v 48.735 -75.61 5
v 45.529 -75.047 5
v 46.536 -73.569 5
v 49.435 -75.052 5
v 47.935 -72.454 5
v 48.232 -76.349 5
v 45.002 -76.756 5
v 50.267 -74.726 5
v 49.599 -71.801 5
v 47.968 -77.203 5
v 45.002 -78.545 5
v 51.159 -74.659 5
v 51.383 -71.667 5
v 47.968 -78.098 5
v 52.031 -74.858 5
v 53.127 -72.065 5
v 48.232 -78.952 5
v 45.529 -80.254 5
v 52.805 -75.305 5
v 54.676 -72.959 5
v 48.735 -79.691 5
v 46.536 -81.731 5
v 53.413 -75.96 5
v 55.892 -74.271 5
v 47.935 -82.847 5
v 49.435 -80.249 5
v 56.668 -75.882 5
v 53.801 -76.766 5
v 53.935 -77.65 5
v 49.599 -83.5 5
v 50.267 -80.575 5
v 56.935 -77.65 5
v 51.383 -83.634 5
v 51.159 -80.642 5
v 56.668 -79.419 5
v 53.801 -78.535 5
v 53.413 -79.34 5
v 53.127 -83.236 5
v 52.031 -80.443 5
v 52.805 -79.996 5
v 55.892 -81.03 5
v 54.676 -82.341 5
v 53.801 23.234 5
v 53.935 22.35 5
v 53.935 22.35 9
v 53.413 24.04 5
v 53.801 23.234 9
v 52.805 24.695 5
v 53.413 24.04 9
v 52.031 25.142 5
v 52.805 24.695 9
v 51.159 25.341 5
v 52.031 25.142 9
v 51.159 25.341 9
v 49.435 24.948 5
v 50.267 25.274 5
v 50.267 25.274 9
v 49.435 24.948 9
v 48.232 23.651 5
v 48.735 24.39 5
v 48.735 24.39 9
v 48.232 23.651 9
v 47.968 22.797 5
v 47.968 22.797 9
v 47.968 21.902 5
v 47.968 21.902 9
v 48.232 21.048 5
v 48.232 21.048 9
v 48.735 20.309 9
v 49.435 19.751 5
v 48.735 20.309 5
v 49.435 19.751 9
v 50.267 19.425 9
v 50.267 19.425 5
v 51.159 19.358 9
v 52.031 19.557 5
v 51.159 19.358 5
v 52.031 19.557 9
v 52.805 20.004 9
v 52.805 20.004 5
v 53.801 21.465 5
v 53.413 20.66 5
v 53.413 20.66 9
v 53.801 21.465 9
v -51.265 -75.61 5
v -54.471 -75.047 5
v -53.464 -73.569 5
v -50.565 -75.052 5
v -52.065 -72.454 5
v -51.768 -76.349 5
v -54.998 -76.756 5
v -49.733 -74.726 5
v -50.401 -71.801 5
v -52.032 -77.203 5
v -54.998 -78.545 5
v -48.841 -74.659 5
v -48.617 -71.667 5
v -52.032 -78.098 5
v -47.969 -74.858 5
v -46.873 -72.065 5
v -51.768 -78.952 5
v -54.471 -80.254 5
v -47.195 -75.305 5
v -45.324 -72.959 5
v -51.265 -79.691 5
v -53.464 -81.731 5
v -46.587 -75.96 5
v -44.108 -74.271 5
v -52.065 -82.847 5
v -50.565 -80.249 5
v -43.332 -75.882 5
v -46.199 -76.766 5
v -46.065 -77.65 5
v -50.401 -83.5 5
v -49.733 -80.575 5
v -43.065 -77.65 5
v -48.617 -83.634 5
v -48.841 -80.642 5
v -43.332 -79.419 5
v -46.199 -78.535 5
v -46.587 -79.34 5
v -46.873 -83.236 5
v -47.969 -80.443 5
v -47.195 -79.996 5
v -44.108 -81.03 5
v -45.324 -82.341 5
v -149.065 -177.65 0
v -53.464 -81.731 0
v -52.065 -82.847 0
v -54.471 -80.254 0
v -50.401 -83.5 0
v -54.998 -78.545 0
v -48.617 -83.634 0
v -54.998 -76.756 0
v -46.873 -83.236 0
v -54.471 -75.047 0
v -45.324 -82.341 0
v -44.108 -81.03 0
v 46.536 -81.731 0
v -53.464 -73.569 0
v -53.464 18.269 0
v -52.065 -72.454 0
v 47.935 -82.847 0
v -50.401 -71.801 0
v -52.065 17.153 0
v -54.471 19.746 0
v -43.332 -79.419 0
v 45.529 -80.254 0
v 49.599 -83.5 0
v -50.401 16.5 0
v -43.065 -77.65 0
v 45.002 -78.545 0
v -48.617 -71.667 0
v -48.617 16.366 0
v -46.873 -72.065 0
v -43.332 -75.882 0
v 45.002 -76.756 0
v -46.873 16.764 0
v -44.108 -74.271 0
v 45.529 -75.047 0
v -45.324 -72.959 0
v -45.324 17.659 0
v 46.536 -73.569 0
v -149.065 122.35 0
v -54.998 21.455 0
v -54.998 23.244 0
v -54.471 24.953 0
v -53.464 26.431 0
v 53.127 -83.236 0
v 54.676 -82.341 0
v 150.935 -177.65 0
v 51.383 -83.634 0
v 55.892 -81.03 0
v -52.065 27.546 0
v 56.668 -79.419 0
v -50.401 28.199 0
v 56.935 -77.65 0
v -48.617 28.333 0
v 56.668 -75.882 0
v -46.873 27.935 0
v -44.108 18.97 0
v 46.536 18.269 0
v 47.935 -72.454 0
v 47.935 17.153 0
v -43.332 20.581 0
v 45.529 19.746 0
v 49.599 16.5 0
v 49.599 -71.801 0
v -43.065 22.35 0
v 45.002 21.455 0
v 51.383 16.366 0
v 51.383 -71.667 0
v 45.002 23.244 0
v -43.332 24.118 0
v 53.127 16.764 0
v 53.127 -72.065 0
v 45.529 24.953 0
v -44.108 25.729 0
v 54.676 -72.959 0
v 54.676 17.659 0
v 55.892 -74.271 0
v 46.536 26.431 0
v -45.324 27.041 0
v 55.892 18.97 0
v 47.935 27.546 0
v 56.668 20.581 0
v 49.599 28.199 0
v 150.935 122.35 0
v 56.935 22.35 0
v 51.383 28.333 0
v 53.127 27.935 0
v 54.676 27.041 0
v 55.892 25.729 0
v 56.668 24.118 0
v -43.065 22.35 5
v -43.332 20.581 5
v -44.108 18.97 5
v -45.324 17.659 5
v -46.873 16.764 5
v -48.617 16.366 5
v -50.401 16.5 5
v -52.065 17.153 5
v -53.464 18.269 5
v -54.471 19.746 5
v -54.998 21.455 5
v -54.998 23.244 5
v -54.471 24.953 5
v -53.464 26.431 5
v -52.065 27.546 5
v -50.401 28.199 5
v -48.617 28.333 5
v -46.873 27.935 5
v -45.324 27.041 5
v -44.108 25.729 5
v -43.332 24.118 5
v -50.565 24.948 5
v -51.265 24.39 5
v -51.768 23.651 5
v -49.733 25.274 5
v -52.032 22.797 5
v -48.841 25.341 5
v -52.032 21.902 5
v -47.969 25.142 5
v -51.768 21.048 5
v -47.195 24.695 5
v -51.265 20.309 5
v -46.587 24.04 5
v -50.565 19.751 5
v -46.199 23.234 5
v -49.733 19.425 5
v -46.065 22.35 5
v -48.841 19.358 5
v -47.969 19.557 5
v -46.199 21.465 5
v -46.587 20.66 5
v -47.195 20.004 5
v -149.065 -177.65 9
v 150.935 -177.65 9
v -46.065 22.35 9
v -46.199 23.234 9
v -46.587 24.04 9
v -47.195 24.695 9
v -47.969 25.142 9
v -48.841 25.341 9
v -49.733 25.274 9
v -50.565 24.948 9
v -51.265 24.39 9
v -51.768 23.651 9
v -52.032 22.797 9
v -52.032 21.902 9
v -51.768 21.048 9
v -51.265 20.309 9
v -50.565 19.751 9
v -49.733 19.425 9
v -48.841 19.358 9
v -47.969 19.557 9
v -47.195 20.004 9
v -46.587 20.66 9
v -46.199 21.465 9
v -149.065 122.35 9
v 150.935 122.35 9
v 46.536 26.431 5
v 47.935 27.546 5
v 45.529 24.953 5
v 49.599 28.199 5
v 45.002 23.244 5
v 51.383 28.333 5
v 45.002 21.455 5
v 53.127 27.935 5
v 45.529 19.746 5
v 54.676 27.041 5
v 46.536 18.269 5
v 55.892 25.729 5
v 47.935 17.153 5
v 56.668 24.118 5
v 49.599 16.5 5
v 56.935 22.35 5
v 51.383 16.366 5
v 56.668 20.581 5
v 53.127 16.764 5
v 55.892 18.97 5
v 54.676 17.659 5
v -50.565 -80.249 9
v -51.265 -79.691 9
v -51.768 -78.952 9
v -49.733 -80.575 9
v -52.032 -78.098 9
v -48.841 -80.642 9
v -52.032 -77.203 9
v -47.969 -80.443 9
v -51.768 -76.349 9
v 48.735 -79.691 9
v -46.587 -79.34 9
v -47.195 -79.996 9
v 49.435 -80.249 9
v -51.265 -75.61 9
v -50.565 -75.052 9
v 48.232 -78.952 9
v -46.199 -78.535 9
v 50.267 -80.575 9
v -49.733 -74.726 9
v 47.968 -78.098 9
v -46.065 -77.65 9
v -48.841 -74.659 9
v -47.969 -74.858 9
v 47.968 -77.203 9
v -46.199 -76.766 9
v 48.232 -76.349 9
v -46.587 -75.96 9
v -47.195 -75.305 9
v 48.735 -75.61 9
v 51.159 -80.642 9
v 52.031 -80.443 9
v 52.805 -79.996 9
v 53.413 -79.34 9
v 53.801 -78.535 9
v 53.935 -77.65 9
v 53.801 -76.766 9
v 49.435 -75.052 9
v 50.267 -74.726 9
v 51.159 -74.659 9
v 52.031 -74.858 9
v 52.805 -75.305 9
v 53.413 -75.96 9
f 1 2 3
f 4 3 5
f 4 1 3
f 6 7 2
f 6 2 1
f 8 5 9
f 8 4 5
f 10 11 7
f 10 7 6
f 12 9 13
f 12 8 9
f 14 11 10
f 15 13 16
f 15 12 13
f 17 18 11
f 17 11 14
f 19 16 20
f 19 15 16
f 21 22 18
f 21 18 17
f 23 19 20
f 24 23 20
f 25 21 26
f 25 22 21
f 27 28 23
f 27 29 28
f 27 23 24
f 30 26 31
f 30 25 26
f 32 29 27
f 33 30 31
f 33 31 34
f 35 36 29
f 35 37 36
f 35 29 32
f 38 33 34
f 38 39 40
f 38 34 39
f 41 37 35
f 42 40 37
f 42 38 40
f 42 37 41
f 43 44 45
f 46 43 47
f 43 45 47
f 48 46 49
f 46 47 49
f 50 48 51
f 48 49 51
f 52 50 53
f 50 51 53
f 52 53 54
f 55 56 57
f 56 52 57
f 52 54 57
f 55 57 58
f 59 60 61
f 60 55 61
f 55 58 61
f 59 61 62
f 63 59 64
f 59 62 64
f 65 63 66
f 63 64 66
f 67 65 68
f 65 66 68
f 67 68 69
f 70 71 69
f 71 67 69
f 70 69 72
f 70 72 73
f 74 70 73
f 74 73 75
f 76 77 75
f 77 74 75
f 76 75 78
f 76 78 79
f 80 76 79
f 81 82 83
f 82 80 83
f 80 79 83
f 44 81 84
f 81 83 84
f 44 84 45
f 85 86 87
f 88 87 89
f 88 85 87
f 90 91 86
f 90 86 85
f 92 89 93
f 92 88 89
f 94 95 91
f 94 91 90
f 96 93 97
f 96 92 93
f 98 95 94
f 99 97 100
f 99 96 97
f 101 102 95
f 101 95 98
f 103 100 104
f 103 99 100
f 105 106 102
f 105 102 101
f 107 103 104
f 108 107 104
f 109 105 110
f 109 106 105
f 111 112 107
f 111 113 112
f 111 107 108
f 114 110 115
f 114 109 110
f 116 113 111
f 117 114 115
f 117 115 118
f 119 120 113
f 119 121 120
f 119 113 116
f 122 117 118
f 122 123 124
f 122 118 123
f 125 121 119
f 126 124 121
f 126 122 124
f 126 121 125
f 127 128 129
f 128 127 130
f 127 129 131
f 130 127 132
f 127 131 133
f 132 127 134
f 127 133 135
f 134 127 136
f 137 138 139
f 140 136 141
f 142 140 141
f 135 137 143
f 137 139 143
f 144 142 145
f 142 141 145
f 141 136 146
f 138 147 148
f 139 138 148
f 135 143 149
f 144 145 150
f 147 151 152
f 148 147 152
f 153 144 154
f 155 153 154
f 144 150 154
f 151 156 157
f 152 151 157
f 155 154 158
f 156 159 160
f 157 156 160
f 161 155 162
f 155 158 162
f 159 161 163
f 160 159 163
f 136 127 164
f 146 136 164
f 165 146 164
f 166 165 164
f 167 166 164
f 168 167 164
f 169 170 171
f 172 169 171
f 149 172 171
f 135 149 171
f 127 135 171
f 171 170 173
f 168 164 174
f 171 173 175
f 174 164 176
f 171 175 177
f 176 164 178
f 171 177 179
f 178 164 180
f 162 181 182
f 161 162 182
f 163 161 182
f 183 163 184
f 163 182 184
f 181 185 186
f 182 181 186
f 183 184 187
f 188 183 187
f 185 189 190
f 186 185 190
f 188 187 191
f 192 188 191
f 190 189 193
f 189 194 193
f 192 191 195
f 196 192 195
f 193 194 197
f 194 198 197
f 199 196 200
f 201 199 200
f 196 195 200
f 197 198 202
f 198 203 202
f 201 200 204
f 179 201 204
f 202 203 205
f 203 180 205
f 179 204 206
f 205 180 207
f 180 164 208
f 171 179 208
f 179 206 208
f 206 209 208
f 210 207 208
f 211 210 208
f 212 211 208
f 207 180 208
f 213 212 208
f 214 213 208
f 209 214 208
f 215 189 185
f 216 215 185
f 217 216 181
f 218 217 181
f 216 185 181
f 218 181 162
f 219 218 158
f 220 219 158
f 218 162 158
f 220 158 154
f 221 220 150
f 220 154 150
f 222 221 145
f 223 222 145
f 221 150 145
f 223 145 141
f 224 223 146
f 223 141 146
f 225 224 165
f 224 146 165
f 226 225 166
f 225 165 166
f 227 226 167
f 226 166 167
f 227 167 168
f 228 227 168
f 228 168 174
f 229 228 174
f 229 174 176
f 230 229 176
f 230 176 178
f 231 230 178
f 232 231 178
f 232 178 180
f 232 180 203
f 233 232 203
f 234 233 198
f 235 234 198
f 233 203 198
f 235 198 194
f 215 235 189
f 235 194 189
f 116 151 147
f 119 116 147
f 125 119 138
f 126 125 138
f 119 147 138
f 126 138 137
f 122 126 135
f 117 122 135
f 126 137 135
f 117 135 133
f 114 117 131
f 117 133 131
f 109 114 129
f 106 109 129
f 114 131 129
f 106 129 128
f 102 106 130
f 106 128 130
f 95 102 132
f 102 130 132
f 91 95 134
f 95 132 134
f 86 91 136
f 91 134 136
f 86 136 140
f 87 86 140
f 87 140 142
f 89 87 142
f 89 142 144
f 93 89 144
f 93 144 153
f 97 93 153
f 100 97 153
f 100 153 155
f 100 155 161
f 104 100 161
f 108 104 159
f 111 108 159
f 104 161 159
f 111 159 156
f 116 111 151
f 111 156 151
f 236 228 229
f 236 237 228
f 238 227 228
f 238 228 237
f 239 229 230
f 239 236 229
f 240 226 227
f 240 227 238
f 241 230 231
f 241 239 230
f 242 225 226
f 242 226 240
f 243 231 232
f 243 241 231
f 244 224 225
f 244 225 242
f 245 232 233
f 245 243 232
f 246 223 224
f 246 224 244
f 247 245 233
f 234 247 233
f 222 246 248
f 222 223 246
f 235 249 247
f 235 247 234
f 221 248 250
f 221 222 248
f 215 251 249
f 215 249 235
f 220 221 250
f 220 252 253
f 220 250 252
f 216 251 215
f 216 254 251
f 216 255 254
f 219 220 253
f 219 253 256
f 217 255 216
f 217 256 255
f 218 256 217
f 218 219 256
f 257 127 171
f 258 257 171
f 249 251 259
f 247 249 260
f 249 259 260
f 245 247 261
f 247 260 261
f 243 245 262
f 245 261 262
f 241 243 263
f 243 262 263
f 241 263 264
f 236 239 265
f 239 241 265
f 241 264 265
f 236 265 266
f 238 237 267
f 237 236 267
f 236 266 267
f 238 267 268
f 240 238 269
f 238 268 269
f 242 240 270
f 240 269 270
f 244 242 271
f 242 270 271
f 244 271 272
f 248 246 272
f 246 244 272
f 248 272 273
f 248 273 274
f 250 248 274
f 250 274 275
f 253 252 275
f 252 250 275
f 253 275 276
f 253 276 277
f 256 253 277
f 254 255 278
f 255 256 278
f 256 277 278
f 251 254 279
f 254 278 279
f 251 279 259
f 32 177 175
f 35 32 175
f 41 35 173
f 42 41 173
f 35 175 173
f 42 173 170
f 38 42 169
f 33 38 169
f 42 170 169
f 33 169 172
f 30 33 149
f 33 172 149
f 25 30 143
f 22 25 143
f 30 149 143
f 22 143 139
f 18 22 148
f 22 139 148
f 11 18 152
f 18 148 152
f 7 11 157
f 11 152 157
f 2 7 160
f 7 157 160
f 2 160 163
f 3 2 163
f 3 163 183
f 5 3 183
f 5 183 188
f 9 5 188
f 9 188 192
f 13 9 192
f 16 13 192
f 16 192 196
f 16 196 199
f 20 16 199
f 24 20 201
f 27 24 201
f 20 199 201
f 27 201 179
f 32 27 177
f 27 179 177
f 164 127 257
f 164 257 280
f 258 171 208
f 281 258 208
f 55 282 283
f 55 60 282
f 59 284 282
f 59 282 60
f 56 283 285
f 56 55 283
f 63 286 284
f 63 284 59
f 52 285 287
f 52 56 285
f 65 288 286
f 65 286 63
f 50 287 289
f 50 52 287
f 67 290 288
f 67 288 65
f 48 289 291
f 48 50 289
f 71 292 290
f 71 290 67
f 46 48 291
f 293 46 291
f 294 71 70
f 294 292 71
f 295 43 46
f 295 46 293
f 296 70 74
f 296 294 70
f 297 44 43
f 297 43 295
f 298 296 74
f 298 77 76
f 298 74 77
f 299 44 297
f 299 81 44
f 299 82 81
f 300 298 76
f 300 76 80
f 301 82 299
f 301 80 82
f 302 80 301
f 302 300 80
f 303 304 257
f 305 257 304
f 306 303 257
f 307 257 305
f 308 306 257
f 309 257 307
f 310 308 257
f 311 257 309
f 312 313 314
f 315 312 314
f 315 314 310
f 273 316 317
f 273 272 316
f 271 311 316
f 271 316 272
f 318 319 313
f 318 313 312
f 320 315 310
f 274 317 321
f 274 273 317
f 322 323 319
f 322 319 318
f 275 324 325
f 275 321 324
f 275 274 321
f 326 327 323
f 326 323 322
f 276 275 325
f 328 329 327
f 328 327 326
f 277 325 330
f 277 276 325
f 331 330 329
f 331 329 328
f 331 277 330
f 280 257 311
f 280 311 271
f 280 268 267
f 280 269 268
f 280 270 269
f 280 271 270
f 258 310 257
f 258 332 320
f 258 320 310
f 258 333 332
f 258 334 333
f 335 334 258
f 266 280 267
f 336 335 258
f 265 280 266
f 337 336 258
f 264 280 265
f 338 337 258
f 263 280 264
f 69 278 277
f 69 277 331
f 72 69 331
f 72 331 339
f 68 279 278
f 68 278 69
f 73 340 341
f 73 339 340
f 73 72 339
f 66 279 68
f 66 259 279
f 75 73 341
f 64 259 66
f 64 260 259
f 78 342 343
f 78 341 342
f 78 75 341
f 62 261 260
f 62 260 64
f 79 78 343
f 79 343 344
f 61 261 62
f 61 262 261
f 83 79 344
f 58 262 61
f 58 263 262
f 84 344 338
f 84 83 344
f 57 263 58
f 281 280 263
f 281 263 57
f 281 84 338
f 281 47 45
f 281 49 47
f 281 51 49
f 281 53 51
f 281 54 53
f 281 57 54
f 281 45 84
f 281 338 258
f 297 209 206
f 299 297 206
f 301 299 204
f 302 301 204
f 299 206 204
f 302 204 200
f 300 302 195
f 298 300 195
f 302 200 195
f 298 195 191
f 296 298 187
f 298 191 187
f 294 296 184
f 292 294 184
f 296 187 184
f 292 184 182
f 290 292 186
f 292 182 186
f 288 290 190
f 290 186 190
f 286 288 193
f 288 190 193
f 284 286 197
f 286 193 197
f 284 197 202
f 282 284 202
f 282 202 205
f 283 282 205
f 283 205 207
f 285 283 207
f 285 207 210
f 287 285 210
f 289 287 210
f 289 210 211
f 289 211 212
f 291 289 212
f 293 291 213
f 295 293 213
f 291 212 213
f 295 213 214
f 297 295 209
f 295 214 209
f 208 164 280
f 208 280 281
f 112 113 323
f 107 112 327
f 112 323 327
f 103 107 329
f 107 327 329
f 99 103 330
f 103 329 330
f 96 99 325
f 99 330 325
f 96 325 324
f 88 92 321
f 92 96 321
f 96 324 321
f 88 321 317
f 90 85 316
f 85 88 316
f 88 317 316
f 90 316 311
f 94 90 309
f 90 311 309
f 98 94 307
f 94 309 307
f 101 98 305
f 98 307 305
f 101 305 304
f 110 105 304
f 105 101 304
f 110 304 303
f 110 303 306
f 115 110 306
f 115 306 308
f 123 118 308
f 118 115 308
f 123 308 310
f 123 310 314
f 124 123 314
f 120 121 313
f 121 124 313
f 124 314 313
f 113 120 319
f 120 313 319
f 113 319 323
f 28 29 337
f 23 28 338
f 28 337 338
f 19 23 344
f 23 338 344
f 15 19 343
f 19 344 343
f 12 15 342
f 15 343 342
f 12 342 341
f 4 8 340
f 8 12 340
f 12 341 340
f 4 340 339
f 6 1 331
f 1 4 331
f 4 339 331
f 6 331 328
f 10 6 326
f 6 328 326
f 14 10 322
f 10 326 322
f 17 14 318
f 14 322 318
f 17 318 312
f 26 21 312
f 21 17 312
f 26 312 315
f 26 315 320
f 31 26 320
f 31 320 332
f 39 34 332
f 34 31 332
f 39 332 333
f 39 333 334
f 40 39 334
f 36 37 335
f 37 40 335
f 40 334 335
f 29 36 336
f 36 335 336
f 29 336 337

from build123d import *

# Parameters (mm, degrees)
F0_W     = 300
F0_H     = 300
F1_DEPTH = 9
F2_R     = 3
F3_DEPTH = 9.001
F4_R     = 6
F4_R_2   = 3
F5_DEPTH = 5


with BuildPart() as f1:
    # F0 (on Top) → F1 (new body)
    with BuildSketch(Plane.XY):
        with Locations((0.934564, -27.650428)):
            Rectangle(F0_W, F0_H)
    extrude(amount=F1_DEPTH)

    # F2 (on face) → F3 (cut, through all)
    with BuildSketch(Plane.XY.offset(9)):
        with Locations((-49.065436, 22.349572)):
            Circle(F2_R)
        with Locations((-49.065436, -77.650428)):
            Circle(F2_R)
        with Locations((50.934564, -77.650428)):
            Circle(F2_R)
        with Locations((50.934564, 22.349572)):
            Circle(F2_R)
    extrude(amount=-F3_DEPTH, mode=Mode.SUBTRACT)

    # F4 (on face) → F5 (cut)
    with BuildSketch(Plane(origin=(0, 0, 0), x_dir=(1, 0, 0), z_dir=(0, 0, -1))):
        with Locations((-49.065436, 77.650428)):
            Circle(F4_R)
        with Locations((-49.065436, 77.650428)):
            Circle(F4_R_2, mode=Mode.SUBTRACT)
        with Locations((50.934564, 77.650428)):
            Circle(F4_R)
        with Locations((50.934564, 77.650428)):
            Circle(F4_R_2, mode=Mode.SUBTRACT)
        with Locations((-49.065436, -22.349572)):
            Circle(F4_R)
        with Locations((-49.065436, -22.349572)):
            Circle(F4_R_2, mode=Mode.SUBTRACT)
        with Locations((50.934564, -22.349572)):
            Circle(F4_R)
        with Locations((50.934564, -22.349572)):
            Circle(F4_R_2, mode=Mode.SUBTRACT)
    extrude(amount=-F5_DEPTH, mode=Mode.SUBTRACT)


solid = f1.part
